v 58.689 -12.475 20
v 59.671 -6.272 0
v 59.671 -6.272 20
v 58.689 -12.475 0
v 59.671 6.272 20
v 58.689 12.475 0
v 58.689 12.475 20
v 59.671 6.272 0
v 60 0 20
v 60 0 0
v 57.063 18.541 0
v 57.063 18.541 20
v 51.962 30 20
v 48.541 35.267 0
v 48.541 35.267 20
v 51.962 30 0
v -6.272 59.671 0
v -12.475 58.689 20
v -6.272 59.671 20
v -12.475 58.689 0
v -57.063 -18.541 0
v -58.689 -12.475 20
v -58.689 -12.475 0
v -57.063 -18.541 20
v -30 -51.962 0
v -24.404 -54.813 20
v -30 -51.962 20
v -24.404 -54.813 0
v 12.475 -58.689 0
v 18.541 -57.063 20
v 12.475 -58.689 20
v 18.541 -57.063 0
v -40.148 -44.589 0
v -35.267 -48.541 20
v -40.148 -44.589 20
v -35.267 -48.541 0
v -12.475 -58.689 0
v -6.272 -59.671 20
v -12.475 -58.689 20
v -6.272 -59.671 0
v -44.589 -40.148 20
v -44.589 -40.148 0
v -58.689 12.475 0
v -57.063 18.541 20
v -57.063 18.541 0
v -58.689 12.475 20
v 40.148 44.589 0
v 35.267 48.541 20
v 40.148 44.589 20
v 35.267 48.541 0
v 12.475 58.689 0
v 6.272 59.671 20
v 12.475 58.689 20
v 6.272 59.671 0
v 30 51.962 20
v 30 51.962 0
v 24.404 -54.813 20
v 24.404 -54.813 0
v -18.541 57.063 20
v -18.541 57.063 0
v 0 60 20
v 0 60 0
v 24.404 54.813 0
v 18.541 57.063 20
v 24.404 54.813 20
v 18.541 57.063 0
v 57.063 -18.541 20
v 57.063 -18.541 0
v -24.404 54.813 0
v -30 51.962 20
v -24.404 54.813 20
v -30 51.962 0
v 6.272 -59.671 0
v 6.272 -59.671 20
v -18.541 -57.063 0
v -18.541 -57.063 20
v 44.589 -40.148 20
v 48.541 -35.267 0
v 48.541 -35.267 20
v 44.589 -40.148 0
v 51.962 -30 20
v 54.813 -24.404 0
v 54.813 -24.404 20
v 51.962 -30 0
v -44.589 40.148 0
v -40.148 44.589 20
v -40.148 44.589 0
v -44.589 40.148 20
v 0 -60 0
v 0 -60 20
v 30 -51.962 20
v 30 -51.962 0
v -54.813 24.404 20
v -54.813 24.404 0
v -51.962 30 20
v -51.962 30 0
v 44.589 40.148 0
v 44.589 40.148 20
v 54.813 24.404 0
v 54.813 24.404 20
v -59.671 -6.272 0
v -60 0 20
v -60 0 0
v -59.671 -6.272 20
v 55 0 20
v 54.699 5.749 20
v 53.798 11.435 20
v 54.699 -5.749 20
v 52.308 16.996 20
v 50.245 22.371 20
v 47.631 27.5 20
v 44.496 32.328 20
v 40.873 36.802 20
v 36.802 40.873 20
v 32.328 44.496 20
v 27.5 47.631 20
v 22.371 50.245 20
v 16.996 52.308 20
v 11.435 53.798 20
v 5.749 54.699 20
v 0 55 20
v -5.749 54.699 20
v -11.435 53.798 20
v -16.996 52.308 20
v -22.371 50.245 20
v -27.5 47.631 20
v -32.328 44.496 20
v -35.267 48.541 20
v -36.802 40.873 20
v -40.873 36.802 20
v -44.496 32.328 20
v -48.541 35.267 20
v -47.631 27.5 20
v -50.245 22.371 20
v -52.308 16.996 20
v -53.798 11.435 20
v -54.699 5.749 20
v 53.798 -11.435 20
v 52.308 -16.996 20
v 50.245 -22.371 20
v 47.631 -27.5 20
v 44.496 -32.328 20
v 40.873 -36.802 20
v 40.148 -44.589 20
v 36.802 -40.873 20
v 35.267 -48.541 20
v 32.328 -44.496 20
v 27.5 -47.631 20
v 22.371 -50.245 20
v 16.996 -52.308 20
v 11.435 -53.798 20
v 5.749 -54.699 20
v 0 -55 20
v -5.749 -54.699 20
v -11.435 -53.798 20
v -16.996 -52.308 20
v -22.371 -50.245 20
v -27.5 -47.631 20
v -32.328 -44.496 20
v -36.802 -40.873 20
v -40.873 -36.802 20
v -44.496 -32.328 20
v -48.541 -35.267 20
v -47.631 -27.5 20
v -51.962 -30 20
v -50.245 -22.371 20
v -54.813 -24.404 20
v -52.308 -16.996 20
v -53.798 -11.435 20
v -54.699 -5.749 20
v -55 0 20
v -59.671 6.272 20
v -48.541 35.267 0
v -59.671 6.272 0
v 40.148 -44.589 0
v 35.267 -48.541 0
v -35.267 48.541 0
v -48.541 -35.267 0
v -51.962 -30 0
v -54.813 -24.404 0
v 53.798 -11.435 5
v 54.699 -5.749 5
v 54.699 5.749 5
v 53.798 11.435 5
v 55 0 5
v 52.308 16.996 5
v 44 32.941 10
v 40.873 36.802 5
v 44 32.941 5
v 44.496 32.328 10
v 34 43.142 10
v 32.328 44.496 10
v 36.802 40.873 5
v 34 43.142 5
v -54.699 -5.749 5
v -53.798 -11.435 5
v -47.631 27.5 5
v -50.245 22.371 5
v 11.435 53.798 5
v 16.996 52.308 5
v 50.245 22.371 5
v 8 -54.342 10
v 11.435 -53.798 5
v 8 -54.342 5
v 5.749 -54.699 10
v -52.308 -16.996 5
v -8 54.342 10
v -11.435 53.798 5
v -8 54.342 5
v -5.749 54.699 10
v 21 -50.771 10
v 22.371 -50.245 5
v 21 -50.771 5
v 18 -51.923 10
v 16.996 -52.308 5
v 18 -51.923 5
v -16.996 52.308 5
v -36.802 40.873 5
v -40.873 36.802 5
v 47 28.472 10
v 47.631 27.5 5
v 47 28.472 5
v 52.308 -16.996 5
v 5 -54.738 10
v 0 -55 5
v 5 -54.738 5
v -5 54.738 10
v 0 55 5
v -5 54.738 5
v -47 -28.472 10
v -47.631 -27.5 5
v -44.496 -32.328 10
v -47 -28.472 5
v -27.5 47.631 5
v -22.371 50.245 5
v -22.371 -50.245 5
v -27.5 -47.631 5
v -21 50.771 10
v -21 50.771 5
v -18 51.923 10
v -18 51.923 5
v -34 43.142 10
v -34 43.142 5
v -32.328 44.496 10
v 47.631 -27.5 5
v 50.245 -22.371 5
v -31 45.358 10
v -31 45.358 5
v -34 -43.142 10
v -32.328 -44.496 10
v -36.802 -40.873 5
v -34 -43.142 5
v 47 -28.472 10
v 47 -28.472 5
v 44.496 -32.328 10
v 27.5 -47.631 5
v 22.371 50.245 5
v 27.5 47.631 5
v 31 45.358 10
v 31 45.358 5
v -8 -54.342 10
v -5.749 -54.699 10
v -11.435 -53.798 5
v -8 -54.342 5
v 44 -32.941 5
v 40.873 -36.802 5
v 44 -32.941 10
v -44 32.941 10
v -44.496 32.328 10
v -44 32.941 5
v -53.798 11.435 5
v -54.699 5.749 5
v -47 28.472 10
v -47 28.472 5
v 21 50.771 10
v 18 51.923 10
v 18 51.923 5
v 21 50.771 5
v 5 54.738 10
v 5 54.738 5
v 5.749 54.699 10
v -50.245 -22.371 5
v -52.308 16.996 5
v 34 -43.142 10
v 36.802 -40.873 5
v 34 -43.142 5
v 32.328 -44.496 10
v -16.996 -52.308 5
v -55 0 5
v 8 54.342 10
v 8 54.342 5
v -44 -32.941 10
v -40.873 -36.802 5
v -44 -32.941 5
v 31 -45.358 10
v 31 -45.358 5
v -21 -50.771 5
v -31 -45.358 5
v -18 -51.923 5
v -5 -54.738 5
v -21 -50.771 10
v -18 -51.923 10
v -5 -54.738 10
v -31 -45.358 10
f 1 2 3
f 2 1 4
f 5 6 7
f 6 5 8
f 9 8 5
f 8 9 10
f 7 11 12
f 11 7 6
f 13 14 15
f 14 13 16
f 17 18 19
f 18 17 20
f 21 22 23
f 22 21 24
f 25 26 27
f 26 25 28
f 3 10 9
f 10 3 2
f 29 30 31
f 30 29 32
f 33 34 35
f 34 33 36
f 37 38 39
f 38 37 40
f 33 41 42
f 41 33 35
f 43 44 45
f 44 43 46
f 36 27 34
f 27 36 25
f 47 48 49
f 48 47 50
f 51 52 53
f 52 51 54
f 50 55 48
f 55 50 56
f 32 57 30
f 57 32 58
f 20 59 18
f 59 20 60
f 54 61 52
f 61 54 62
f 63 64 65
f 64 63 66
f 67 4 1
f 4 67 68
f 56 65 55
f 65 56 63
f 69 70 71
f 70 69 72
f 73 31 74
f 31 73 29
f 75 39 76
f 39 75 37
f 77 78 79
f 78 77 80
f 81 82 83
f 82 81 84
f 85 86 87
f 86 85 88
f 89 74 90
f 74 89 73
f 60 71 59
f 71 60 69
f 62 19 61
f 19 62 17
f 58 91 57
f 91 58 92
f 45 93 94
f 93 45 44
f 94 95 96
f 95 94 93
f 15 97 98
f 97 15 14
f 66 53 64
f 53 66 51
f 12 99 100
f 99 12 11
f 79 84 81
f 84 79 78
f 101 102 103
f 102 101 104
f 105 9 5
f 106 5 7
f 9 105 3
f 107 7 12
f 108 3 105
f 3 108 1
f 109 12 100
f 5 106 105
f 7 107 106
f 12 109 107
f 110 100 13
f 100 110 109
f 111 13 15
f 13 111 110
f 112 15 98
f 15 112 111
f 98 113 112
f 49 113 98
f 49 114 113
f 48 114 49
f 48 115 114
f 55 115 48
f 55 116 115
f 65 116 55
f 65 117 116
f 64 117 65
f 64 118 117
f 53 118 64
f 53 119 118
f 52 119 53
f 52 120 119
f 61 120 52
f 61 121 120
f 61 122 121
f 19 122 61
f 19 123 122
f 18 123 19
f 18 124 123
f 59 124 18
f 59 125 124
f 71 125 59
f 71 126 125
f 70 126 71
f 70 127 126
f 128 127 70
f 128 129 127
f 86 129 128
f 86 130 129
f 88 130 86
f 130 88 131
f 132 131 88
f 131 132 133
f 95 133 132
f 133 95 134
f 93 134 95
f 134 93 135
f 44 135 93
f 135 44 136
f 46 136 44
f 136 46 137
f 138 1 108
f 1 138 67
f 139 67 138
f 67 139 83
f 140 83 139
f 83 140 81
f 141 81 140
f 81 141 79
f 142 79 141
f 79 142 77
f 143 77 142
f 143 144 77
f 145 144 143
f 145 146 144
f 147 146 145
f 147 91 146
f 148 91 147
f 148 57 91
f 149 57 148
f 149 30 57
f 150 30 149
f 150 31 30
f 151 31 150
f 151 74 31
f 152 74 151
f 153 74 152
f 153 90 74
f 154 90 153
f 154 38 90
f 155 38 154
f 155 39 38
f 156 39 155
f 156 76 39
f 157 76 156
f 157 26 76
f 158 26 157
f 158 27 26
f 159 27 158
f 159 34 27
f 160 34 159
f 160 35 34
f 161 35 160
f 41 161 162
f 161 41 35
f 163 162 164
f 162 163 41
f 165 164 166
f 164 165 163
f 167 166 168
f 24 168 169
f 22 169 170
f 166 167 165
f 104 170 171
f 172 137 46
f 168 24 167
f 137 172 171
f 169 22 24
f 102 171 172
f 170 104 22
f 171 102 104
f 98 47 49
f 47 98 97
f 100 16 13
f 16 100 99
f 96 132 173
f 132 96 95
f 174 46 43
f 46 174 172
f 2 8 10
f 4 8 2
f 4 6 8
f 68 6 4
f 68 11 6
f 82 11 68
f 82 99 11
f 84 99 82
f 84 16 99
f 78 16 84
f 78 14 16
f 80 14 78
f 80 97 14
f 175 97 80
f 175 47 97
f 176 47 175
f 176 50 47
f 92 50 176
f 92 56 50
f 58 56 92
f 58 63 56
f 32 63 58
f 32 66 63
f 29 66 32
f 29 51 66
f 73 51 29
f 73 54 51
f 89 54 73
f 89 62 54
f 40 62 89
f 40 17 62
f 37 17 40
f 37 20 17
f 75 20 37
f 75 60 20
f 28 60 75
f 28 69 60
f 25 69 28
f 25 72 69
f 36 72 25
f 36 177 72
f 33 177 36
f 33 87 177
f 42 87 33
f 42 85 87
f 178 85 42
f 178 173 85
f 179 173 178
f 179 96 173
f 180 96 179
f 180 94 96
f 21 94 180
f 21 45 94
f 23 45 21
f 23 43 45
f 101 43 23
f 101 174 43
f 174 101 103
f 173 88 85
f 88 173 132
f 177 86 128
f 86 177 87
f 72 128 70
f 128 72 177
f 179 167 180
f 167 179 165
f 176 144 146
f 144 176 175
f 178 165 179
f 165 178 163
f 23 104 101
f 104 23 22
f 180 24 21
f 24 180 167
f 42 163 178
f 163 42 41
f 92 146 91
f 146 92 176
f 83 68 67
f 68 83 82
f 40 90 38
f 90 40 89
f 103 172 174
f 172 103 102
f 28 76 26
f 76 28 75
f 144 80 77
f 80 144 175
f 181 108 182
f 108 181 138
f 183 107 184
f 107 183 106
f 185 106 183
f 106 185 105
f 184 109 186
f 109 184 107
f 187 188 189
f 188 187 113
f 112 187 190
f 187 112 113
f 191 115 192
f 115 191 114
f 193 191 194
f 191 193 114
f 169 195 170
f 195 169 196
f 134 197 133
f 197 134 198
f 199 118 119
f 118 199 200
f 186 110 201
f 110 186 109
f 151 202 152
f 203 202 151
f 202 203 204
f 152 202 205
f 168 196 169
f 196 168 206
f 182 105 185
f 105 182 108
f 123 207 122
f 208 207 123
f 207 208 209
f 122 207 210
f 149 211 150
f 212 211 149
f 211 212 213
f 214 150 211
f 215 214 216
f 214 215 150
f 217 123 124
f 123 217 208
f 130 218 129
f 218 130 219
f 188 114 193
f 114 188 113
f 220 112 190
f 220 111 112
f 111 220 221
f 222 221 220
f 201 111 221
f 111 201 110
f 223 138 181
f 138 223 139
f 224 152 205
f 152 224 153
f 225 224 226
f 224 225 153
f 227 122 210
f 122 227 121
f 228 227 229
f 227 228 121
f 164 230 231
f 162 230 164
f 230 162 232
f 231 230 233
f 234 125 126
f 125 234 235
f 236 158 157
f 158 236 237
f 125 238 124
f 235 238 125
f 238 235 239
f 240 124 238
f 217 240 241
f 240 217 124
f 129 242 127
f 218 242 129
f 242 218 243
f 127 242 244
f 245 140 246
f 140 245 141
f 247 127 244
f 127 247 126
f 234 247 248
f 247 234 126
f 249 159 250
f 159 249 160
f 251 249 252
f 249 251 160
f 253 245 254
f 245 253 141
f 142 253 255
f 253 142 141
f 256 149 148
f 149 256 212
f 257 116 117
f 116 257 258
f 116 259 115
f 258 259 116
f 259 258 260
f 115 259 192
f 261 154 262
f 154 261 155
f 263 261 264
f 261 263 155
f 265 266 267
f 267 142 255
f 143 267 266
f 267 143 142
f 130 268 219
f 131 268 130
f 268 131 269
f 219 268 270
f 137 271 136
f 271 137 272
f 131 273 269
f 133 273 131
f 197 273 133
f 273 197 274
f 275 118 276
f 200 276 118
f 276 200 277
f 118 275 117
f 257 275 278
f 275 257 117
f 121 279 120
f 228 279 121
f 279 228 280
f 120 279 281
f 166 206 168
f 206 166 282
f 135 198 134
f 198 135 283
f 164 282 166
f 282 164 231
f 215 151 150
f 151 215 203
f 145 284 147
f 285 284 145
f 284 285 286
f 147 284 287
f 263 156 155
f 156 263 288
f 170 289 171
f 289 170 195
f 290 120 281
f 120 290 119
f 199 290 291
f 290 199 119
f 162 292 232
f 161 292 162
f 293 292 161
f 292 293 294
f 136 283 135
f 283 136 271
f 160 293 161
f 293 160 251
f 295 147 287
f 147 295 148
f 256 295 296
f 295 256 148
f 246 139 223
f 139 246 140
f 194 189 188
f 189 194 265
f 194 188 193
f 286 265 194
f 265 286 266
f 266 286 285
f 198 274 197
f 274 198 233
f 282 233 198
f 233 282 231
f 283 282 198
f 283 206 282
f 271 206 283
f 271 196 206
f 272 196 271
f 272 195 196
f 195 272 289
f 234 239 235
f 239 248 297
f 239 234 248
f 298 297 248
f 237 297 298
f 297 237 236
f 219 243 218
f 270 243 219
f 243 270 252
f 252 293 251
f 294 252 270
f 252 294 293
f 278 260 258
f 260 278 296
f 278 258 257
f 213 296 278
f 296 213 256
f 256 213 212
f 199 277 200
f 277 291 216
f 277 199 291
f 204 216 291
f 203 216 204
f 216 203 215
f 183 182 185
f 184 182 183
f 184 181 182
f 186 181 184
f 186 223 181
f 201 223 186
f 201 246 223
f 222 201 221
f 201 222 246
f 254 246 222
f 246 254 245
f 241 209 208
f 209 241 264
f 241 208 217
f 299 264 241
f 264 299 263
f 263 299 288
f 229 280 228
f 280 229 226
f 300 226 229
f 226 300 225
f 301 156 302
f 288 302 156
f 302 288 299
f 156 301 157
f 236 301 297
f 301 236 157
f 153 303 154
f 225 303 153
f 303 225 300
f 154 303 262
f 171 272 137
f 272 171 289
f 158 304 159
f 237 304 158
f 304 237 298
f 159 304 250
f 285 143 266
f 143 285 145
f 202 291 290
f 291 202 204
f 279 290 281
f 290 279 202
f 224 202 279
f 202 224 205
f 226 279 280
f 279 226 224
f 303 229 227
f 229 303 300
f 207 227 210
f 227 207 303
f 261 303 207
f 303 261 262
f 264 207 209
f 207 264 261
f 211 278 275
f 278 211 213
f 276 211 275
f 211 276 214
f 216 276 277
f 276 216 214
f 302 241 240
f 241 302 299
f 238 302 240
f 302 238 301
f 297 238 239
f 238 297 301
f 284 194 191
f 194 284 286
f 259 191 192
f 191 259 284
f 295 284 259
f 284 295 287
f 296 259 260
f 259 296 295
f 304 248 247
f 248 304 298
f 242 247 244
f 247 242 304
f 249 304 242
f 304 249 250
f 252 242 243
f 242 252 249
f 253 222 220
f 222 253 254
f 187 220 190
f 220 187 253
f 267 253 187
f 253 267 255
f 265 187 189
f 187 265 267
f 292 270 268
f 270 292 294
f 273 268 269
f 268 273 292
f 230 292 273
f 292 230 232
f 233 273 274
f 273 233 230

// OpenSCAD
// Copyright 2018 Marcos Del Sol Vives
// SPDX-License-Identifier: ISC

// Detail
$fn = 60;

// Outer drainer radius, in mm
radius = 60;

// Outer drainer height, in mm
height = 20;

// Thickness of the walls, in mm
wallwidth = 5;

// Width of each fin, in mm
finwidth = 3;

// Space between each fin, in mm
finspacing = 10;

// Height of each fin, in mm
finheight = 5;

intersection() {
    union() {
        difference() {
            cylinder(r=radius, h=height);
            translate([0, 0, wallwidth]) {
                cylinder(r=radius - wallwidth, h=height-wallwidth);
            }
        }

        for (finpos = [finspacing / 2 : finspacing + finwidth : radius]) {
            translate([finpos, -radius, 0])
                cube([finwidth, radius * 2, finheight + wallwidth]);

            translate([-finpos - finwidth, -radius, 0])
                cube([finwidth, radius * 2, finheight + wallwidth]);
        }
    }
    cylinder(r=radius, h=height);
}
